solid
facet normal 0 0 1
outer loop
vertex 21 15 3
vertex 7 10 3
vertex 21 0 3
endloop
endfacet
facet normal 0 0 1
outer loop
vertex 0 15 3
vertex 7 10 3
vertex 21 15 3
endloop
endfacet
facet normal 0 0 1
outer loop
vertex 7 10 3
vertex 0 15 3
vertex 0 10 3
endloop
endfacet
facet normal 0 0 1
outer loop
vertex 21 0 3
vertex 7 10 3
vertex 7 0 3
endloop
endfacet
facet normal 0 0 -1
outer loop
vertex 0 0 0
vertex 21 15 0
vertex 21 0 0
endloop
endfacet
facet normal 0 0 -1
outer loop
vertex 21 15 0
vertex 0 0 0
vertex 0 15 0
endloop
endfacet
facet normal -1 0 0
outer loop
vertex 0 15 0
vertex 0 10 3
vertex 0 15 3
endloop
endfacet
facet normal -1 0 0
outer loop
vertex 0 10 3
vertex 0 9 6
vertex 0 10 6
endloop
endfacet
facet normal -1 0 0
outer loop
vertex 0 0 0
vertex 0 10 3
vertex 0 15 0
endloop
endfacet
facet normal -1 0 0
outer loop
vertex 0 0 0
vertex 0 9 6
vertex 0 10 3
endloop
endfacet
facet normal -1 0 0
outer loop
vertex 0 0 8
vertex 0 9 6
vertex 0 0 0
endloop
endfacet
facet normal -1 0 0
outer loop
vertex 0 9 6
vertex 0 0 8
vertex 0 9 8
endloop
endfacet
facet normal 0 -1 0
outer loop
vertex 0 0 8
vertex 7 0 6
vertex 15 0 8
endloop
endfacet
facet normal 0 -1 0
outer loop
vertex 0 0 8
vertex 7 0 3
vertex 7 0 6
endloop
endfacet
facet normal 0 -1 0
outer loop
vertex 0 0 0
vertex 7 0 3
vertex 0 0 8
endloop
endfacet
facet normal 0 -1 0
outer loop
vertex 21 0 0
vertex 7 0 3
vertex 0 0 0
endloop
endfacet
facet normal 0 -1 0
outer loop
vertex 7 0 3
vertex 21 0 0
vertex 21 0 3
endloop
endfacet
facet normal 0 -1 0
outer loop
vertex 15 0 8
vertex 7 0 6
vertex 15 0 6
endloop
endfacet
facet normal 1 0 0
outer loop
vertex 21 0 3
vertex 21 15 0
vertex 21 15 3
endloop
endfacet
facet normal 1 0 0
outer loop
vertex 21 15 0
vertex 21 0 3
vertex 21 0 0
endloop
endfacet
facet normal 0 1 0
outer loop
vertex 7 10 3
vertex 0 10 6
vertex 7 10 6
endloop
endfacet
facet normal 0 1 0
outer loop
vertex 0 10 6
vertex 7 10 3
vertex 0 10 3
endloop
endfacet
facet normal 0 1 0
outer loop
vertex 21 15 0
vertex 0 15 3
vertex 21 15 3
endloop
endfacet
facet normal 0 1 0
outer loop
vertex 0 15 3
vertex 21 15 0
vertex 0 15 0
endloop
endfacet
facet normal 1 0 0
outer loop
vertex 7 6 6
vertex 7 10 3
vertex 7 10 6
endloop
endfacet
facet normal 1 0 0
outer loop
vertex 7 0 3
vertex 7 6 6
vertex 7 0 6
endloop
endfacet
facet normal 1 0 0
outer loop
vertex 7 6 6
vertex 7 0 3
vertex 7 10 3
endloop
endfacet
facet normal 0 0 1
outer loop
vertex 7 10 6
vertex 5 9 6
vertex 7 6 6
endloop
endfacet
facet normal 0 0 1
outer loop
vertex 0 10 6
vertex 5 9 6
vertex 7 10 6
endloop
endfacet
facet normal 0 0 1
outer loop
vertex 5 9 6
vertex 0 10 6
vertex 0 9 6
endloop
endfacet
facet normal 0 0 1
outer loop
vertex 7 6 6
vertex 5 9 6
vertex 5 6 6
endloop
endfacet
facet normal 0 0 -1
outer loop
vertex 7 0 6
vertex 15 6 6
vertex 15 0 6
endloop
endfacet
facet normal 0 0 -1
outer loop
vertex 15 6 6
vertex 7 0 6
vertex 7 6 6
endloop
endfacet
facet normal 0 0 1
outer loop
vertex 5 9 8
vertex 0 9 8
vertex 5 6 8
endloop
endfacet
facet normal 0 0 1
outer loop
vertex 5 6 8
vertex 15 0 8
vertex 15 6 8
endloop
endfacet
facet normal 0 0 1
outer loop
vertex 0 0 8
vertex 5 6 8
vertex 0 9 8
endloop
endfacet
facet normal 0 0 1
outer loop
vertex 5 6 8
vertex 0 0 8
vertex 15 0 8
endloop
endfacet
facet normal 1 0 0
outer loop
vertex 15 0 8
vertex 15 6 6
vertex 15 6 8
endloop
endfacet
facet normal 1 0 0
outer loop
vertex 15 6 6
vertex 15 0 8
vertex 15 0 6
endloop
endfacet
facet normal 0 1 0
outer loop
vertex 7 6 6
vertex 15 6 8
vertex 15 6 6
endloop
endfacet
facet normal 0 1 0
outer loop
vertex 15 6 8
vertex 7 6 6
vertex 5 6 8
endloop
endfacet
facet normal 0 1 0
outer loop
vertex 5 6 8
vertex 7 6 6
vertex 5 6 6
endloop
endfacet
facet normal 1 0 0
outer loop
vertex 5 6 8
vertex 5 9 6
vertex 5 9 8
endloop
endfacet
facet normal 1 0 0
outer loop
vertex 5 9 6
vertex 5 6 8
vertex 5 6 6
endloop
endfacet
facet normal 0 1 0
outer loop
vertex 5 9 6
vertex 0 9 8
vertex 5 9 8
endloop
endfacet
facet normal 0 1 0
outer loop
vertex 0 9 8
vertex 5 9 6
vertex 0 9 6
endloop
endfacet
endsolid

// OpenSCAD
translate([3.5, 2.5, 1.5]) color([0.1086514152541781, 0.5608299889315482, 0.4811722969562161]) cube([7, 5, 3], center=true);
translate([10.5, 2.5, 1.5]) color([0.3370805445376659, 0.7978743610995221, 0.8123286615584164]) cube([7, 5, 3], center=true);
translate([17.5, 2.5, 1.5]) color([0.12432480215345709, 0.11600806340273684, 0.49773452003699037]) cube([7, 5, 3], center=true);
translate([3.5, 7.5, 1.5]) color([0.03782437966691787, 0.3350819106008931, 0.6871104903101904]) cube([7, 5, 3], center=true);
translate([10.5, 7.5, 1.5]) color([0.1556641006446543, 0.16655617674247947, 0.5644873855678092]) cube([7, 5, 3], center=true);
translate([17.5, 7.5, 1.5]) color([0.8061184955728092, 0.9914997491156944, 0.08692177434142434]) cube([7, 5, 3], center=true);
translate([3.5, 12.5, 1.5]) color([0.8077725699891862, 0.19804028235278703, 0.22105871931579824]) cube([7, 5, 3], center=true);
translate([10.5, 12.5, 1.5]) color([0.38481190061458204, 0.09807651038324794, 0.5564746075794378]) cube([7, 5, 3], center=true);
translate([17.5, 12.5, 1.5]) color([0.289820808533909, 0.9201526827262252, 0.7882887690133504]) cube([7, 5, 3], center=true);
translate([3.5, 2.5, 4.5]) color([0.714406368727256, 0.21725354658840645, 0.08366324281939452]) cube([7, 5, 3], center=true);
translate([3.5, 7.5, 4.5]) color([0.2201378642652858, 0.9991066326269249, 0.5852279869996022]) cube([7, 5, 3], center=true);
translate([2.5, 1.5, 7.0]) color([0.1665811123789923, 0.1919450116047291, 0.1150124003280546]) cube([5, 3, 2], center=true);
translate([7.5, 1.5, 7.0]) color([0.8219806914298157, 0.8528586901873659, 0.02761895137288195]) cube([5, 3, 2], center=true);
translate([12.5, 1.5, 7.0]) color([0.5258157137901469, 0.752438401258893, 0.20168791799925478]) cube([5, 3, 2], center=true);
translate([2.5, 4.5, 7.0]) color([0.4970874741521001, 0.2564796746315954, 0.6409972685732053]) cube([5, 3, 2], center=true);
translate([7.5, 4.5, 7.0]) color([0.9970404948887329, 0.797433214008021, 0.6234150837835258]) cube([5, 3, 2], center=true);
translate([12.5, 4.5, 7.0]) color([0.10462968943990791, 0.4584080456050631, 0.3616420965372864]) cube([5, 3, 2], center=true);
translate([2.5, 7.5, 7.0]) color([0.8269865896652219, 0.10474628201641056, 0.596240475647071]) cube([5, 3, 2], center=true);
